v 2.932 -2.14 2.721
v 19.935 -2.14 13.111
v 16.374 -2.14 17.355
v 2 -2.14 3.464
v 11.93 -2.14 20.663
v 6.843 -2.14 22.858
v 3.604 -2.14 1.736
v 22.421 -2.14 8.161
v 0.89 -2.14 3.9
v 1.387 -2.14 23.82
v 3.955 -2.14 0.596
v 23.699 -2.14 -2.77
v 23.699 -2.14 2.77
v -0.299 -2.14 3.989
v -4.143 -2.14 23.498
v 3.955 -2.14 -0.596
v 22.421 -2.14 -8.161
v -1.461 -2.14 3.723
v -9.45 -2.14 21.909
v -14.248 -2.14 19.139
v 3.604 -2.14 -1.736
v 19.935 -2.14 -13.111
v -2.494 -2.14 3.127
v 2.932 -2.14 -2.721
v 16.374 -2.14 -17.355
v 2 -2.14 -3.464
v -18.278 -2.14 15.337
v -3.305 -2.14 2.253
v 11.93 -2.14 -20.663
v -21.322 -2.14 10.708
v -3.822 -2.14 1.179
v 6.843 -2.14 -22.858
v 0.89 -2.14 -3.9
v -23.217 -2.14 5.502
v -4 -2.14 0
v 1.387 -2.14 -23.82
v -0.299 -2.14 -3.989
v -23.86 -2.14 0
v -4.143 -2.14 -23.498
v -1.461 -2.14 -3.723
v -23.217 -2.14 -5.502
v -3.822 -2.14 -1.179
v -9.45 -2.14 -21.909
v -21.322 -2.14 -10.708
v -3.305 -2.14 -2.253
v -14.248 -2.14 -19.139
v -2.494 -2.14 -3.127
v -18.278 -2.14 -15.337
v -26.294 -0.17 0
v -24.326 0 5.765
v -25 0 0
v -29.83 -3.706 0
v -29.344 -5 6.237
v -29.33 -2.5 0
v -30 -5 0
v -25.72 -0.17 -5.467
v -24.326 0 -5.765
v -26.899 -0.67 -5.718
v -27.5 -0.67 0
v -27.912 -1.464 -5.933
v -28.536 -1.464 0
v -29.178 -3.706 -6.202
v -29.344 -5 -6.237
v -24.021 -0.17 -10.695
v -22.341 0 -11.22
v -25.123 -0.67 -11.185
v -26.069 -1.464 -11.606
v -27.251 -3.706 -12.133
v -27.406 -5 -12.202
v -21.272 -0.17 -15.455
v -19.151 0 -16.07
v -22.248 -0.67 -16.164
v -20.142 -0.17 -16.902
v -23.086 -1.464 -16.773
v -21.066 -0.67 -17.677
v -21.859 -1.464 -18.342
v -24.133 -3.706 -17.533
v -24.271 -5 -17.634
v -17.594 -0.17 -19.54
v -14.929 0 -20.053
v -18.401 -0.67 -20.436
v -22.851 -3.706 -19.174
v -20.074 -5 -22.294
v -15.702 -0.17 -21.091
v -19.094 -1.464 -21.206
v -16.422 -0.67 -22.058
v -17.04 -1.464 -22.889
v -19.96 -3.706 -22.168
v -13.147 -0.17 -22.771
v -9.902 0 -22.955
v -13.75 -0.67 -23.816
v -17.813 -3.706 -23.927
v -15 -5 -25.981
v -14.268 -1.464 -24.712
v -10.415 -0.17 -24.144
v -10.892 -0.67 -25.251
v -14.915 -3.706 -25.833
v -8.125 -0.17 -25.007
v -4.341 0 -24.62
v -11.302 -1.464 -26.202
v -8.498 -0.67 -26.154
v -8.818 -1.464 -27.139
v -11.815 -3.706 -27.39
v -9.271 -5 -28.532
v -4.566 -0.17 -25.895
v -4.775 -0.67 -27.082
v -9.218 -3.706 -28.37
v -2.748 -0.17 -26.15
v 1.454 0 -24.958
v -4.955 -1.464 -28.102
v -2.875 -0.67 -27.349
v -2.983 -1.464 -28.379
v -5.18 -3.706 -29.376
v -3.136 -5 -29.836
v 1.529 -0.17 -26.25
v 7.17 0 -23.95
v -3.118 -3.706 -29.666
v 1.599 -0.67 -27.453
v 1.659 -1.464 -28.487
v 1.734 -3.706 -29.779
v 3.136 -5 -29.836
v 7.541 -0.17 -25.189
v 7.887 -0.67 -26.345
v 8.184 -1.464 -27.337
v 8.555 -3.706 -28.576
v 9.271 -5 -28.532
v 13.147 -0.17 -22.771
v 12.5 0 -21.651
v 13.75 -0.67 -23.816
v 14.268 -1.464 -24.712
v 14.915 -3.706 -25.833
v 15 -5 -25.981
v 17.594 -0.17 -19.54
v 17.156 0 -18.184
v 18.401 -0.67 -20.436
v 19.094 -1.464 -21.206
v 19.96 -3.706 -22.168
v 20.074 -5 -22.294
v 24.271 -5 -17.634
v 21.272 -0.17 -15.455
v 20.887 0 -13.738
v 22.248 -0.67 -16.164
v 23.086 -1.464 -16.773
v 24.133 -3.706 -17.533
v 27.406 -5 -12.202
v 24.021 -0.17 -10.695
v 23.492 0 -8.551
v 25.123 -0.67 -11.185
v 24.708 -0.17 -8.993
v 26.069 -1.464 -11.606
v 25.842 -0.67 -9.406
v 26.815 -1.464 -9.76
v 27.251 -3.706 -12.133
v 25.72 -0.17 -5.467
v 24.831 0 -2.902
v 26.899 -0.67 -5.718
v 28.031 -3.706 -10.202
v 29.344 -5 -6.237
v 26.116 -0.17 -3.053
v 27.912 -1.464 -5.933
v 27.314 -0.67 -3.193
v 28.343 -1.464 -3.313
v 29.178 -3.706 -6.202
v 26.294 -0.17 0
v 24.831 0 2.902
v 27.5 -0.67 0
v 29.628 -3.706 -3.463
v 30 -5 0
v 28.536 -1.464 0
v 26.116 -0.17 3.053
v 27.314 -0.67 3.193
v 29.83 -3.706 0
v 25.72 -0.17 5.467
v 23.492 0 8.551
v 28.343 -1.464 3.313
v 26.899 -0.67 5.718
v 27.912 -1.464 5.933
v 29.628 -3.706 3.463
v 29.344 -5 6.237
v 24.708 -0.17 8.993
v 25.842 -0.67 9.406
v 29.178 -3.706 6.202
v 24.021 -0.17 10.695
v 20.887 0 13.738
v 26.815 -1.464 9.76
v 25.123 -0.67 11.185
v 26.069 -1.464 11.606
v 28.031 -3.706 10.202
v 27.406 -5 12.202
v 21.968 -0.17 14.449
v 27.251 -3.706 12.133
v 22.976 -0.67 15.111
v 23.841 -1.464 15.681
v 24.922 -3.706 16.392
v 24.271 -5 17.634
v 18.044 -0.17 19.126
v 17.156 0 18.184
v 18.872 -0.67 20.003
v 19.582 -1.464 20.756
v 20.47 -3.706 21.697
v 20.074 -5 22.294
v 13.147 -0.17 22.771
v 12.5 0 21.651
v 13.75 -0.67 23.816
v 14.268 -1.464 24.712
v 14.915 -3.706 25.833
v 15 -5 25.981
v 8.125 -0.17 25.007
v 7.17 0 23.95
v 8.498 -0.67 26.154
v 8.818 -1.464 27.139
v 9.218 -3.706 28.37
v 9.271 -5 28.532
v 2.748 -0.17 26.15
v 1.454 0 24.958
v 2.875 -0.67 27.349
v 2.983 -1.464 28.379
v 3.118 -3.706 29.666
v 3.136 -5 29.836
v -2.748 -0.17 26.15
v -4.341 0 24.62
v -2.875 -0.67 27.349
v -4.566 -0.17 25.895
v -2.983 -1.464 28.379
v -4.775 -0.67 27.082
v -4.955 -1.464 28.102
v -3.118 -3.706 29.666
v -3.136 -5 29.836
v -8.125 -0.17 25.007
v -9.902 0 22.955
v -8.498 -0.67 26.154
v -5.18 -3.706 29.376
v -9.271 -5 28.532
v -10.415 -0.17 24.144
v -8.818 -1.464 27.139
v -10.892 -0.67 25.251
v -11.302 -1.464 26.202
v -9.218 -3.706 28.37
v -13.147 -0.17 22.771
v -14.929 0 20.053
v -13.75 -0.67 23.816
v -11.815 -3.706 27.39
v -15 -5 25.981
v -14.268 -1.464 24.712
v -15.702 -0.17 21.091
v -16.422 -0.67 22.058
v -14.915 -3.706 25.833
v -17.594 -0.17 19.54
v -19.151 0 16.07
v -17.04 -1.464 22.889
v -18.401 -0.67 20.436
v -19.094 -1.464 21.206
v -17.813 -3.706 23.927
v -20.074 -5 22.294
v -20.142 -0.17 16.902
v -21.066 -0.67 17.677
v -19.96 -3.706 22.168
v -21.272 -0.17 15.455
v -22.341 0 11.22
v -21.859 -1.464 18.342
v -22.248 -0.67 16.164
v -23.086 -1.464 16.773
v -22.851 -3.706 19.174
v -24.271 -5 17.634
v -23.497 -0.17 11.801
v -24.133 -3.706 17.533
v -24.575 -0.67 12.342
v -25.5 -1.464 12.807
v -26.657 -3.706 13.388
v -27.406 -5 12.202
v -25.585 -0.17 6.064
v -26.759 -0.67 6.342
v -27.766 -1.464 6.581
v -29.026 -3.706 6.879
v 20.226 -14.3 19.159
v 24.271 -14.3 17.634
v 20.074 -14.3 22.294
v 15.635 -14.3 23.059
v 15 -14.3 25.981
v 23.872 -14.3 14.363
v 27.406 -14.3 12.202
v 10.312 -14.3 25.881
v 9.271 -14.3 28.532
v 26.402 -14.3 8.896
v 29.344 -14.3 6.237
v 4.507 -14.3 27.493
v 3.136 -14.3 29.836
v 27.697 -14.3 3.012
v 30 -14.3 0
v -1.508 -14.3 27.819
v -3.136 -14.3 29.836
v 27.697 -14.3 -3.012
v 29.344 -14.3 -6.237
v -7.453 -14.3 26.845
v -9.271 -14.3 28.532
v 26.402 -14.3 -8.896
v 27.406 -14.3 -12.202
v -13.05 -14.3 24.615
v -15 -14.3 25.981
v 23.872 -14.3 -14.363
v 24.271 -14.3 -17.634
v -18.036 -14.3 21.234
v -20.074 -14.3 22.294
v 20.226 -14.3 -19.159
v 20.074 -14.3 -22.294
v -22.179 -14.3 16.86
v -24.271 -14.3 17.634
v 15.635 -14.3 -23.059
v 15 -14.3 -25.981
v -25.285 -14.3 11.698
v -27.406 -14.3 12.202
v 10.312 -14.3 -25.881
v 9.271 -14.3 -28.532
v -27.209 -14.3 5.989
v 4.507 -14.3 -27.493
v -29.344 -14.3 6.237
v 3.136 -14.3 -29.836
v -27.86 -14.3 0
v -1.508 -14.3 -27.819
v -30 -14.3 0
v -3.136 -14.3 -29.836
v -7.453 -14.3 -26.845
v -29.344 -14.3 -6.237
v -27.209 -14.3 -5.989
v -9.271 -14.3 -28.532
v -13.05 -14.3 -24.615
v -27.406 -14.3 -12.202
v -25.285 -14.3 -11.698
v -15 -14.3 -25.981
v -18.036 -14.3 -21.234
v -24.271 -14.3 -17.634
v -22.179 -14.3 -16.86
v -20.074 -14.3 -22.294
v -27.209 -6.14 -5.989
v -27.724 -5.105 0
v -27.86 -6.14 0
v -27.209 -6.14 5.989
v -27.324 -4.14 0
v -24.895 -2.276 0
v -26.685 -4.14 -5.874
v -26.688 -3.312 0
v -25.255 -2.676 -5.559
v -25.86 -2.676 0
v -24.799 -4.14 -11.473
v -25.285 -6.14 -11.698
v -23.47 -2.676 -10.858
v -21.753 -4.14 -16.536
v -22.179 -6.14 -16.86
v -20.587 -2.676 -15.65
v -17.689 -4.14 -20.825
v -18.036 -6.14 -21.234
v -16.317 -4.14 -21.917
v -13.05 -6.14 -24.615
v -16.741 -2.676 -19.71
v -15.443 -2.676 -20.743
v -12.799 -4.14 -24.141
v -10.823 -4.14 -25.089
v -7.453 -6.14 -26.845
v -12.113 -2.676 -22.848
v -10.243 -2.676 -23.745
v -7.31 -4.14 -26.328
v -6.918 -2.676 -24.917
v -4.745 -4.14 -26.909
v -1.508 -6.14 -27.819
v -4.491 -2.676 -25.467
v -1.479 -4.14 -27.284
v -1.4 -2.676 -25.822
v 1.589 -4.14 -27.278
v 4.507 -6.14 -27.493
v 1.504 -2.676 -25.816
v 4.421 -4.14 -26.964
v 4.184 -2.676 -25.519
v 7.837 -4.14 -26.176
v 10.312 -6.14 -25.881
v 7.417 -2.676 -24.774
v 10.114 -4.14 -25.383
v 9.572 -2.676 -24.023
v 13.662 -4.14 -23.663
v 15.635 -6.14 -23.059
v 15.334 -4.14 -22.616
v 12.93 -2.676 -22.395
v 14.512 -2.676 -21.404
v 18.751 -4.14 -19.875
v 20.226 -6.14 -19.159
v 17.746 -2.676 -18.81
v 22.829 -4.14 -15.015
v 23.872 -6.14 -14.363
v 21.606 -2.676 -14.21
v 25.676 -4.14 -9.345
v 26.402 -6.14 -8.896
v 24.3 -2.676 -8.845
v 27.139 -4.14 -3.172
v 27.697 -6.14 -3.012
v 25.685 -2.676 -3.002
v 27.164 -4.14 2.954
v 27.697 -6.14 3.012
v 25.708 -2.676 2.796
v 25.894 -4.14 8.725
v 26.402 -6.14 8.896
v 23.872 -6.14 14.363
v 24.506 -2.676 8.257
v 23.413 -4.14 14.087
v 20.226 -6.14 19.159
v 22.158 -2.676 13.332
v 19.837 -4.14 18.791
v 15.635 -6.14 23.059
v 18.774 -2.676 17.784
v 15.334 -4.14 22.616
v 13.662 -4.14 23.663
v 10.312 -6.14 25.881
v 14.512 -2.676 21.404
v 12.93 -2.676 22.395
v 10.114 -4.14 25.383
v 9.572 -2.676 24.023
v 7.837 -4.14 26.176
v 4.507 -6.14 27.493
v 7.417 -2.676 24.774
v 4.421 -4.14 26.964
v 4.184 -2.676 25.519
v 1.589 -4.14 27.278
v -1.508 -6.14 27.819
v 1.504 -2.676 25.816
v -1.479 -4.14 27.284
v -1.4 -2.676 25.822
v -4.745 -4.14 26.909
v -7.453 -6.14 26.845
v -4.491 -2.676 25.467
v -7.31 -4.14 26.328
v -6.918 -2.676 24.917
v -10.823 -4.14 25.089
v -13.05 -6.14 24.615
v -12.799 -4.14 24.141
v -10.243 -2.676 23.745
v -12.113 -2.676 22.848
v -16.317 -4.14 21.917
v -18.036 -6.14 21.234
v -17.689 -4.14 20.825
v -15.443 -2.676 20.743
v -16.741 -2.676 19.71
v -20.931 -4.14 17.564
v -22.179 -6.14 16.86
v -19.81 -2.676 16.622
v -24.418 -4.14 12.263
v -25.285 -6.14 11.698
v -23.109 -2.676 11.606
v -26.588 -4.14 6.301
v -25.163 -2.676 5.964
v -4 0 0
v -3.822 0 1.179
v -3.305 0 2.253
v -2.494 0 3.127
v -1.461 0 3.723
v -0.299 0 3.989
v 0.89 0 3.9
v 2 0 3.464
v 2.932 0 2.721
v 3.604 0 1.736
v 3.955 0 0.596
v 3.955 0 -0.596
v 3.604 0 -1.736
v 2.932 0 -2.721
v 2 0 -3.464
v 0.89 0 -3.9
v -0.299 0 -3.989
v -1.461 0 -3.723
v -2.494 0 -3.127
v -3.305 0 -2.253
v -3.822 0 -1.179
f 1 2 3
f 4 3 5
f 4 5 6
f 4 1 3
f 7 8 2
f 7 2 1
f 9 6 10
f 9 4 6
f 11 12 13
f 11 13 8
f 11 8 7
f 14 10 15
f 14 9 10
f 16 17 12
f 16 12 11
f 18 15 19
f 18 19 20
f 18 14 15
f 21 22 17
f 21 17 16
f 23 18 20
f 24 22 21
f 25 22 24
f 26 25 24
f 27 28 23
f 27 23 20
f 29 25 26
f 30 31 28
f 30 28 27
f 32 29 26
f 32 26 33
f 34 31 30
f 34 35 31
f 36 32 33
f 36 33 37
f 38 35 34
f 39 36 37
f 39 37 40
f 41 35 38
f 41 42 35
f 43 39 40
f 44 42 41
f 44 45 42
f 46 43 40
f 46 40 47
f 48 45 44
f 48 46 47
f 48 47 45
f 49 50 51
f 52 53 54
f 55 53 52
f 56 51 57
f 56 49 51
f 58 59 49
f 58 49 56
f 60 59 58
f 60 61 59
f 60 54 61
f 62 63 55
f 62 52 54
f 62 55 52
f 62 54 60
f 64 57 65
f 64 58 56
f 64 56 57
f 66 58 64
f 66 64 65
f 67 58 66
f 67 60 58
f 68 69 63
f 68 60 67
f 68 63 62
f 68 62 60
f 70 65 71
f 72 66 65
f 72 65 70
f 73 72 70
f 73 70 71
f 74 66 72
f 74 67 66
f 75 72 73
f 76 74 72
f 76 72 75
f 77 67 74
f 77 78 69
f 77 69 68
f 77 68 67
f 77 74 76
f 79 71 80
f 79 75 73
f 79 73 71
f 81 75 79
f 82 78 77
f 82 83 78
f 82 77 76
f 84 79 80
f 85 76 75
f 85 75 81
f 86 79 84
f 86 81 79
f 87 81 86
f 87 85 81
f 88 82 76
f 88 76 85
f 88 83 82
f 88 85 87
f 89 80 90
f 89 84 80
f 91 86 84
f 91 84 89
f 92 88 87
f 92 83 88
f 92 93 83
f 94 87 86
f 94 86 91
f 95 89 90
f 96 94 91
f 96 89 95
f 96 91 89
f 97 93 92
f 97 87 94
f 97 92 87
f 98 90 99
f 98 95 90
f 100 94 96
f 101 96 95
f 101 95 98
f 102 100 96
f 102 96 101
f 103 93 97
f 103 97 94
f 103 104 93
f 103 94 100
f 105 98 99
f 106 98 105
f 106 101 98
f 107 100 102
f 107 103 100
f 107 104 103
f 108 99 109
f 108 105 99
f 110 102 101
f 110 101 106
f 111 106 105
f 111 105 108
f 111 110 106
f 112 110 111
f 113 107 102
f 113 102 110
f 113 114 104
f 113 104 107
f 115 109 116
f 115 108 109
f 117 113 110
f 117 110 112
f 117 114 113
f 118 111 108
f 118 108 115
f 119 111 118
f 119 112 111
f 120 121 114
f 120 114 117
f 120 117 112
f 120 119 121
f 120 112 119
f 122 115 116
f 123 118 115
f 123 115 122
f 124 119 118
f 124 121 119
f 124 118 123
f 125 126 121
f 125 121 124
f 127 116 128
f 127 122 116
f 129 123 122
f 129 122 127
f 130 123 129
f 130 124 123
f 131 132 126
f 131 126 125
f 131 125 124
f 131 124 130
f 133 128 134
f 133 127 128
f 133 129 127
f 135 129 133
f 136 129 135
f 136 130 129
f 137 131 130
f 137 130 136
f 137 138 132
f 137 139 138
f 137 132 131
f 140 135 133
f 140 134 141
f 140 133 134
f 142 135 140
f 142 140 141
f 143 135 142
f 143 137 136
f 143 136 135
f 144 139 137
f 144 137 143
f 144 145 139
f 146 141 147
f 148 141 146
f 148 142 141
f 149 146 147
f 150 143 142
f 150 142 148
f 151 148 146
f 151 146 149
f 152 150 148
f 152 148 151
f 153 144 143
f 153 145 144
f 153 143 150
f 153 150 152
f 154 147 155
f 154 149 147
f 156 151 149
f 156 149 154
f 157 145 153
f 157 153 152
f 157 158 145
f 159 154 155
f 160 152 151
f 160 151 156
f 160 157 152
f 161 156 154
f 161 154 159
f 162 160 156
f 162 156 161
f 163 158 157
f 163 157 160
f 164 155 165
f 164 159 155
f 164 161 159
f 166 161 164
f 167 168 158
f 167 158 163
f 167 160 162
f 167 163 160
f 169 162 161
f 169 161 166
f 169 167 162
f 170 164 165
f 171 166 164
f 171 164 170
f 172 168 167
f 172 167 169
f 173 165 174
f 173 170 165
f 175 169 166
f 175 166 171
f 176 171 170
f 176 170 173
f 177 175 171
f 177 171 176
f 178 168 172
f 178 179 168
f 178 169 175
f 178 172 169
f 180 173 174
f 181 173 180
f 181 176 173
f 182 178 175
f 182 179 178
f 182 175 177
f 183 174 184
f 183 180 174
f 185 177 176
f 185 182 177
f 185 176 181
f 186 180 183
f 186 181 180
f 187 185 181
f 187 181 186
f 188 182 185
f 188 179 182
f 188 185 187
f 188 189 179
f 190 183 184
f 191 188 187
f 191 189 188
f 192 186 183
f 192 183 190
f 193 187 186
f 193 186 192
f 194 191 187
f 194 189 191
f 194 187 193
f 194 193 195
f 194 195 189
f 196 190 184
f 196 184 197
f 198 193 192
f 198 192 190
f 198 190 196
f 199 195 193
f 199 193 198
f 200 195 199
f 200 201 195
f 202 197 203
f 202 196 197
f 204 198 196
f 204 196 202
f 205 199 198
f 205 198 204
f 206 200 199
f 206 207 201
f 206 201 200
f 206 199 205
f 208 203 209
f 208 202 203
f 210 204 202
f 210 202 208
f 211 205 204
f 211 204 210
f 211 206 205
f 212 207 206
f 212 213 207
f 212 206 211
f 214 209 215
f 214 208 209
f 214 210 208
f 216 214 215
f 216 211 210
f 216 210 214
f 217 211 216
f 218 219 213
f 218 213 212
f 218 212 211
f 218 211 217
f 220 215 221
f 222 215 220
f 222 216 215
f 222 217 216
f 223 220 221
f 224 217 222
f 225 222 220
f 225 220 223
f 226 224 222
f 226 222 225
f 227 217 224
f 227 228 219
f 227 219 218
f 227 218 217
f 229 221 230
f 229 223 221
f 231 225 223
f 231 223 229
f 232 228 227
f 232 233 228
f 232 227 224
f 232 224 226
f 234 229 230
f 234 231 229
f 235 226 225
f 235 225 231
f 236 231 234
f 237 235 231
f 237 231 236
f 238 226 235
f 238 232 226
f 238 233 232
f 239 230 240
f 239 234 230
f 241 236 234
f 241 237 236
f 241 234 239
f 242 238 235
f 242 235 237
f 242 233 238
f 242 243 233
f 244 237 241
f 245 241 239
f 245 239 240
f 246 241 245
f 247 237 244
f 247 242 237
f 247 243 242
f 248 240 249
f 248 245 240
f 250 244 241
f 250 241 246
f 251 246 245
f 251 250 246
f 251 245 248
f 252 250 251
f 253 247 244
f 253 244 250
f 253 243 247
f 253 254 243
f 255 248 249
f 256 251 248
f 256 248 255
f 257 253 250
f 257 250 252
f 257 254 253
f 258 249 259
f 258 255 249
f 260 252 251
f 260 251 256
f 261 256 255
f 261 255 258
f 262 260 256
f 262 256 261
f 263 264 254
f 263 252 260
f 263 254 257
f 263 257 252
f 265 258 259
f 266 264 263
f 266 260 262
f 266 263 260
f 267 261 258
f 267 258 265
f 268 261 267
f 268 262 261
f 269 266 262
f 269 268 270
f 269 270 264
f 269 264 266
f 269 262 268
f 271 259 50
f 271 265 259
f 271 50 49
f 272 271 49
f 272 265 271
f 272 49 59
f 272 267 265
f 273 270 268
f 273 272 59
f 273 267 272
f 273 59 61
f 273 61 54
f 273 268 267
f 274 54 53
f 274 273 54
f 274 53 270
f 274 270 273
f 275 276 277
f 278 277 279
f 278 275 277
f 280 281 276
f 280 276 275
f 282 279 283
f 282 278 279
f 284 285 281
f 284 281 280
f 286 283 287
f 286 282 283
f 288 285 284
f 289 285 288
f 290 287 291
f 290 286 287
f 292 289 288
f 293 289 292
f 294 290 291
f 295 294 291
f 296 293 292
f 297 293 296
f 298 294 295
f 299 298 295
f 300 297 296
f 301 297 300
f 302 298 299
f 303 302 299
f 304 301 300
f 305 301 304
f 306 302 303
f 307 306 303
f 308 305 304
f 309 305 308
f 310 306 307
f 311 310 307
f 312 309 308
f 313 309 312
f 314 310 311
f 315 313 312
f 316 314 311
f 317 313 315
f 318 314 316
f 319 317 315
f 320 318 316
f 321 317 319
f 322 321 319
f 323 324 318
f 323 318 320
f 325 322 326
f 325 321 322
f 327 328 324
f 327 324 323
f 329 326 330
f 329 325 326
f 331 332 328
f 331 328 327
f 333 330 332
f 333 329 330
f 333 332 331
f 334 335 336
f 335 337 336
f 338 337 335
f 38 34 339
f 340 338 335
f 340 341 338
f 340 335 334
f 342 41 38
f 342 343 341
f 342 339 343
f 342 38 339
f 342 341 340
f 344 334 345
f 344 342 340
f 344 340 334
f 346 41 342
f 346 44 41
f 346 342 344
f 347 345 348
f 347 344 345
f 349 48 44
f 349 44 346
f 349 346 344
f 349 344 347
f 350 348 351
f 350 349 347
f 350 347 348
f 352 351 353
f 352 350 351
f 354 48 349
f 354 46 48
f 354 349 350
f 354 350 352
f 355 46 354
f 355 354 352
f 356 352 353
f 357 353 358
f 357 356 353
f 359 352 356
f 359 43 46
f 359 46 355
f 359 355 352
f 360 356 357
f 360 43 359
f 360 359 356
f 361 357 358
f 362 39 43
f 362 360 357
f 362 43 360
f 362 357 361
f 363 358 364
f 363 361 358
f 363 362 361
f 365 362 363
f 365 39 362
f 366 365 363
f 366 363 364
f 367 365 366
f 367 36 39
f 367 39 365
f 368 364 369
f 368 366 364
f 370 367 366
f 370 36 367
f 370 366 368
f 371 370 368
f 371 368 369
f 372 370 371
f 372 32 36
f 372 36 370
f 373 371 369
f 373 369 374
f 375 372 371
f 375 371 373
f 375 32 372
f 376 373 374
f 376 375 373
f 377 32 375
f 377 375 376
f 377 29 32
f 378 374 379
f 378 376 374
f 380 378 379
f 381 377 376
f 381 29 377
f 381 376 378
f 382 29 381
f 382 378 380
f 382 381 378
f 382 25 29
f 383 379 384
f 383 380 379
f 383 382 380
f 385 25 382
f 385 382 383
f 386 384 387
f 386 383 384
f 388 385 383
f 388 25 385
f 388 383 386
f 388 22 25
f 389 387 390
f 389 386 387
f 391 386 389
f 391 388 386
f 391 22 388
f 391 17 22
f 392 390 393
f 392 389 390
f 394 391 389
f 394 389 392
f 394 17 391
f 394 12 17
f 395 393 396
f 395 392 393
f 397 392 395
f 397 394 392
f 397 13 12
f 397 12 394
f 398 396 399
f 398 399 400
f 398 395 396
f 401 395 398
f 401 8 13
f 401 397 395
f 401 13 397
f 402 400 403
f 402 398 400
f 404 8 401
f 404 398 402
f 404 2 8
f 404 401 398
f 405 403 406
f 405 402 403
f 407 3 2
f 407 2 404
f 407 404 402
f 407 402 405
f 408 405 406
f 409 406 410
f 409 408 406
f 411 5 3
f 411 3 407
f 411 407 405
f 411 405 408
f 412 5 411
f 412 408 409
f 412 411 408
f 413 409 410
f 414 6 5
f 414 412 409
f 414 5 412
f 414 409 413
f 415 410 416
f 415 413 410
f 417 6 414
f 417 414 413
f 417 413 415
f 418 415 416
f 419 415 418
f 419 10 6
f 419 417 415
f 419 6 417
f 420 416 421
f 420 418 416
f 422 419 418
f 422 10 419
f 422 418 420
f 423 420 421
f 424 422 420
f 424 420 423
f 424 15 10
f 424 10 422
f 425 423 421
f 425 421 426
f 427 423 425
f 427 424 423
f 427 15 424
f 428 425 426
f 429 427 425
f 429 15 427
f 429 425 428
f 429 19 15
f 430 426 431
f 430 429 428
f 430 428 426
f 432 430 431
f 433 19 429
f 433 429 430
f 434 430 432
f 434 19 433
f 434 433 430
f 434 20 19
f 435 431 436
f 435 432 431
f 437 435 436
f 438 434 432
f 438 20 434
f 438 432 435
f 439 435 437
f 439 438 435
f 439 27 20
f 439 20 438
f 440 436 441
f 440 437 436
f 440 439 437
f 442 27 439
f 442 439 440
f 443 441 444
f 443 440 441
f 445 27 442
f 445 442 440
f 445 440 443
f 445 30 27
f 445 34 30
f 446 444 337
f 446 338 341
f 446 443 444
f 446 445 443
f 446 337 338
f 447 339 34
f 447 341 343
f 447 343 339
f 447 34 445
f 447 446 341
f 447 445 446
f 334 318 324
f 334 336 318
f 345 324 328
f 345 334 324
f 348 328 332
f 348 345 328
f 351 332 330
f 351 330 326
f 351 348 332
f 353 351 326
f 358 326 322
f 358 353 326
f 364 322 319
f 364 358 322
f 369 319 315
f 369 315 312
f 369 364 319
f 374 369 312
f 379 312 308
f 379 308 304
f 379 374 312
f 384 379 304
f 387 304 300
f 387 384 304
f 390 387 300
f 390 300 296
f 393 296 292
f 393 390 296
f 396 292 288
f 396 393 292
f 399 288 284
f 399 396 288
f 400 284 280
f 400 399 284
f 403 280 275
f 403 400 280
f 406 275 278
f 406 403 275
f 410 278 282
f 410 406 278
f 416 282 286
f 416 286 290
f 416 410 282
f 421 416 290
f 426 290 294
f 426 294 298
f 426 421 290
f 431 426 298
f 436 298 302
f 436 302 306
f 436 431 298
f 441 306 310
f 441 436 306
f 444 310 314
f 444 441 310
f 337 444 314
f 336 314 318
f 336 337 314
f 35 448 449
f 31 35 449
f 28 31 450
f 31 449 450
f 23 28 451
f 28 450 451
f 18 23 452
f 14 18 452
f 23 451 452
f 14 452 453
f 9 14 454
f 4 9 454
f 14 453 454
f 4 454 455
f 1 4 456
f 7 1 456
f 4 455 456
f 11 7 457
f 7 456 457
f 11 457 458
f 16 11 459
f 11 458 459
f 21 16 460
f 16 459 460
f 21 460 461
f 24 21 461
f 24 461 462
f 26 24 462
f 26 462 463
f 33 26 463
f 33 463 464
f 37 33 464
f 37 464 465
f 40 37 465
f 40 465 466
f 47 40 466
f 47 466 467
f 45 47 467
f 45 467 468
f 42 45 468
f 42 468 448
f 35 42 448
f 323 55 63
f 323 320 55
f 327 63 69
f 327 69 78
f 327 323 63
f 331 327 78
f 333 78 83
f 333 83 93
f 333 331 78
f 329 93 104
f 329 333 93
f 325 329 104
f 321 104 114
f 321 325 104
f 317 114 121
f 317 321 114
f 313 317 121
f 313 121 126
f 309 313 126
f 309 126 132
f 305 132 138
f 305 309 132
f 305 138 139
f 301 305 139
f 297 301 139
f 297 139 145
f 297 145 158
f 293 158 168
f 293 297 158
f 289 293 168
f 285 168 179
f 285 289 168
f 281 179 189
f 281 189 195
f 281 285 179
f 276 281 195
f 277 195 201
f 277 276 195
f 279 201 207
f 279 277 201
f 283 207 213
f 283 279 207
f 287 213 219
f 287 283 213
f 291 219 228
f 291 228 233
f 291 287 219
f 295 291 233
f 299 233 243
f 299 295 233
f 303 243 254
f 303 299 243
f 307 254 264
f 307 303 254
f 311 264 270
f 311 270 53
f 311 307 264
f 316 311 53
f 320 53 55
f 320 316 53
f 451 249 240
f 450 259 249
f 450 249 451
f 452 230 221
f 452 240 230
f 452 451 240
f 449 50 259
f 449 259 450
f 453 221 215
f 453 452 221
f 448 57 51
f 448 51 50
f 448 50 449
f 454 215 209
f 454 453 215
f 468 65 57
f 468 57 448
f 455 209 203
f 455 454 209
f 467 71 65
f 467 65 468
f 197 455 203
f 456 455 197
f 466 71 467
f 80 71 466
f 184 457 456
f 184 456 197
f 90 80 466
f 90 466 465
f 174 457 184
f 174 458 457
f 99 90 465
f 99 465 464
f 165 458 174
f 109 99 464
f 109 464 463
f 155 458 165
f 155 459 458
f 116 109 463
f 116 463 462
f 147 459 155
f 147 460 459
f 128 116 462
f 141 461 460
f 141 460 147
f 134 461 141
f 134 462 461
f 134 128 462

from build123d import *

# Parameters (mm, degrees)
ENL_V_MAT_EXTRU_1_REACH = 46.772
ESQUISSE3_R             = 4


with BuildPart() as part:
    # Esquisse2 → Révolution1 (revolve)
    with BuildSketch(Plane.XY):
        with BuildLine():
            Line((0, 0), (-25, 0))
            ThreePointArc((-25, 0), (-28.535533906, -1.464466094), (-30, -5))
            Line((-30, -5), (-30, -14.3))
            Line((-30, -14.3), (-27.86, -14.3))
            Line((-27.86, -14.3), (-27.86, -6.14))
            ThreePointArc((-27.86, -6.14), (-26.688427125, -3.311572875), (-23.86, -2.14))
            Line((-23.86, -2.14), (0, -2.14))
            Line((0, -2.14), (0, 0))
        make_face()
    revolve(axis=Axis((0, 0, 0), (0, -1, 0)))

    # Esquisse3 → Enlèv. mat.-Extru.1 (cut, up to next)
    with BuildSketch(Plane(origin=(0, 0, 0), x_dir=(1, 0, 0), z_dir=(0, 1, 0)), mode=Mode.PRIVATE) as enl_v_mat_extru_1_sk1:
        with Locations(Location((0, 0, 0), (0, 0, 180))):
            Circle(ESQUISSE3_R)
    enl_v_mat_extru_1_tool1 = extrude(enl_v_mat_extru_1_sk1.sketch, amount=-ENL_V_MAT_EXTRU_1_REACH, mode=Mode.PRIVATE) & part.part
    add(enl_v_mat_extru_1_tool1.solids().sort_by_distance((0, 0, 0))[0], mode=Mode.SUBTRACT)


solid = part.part
